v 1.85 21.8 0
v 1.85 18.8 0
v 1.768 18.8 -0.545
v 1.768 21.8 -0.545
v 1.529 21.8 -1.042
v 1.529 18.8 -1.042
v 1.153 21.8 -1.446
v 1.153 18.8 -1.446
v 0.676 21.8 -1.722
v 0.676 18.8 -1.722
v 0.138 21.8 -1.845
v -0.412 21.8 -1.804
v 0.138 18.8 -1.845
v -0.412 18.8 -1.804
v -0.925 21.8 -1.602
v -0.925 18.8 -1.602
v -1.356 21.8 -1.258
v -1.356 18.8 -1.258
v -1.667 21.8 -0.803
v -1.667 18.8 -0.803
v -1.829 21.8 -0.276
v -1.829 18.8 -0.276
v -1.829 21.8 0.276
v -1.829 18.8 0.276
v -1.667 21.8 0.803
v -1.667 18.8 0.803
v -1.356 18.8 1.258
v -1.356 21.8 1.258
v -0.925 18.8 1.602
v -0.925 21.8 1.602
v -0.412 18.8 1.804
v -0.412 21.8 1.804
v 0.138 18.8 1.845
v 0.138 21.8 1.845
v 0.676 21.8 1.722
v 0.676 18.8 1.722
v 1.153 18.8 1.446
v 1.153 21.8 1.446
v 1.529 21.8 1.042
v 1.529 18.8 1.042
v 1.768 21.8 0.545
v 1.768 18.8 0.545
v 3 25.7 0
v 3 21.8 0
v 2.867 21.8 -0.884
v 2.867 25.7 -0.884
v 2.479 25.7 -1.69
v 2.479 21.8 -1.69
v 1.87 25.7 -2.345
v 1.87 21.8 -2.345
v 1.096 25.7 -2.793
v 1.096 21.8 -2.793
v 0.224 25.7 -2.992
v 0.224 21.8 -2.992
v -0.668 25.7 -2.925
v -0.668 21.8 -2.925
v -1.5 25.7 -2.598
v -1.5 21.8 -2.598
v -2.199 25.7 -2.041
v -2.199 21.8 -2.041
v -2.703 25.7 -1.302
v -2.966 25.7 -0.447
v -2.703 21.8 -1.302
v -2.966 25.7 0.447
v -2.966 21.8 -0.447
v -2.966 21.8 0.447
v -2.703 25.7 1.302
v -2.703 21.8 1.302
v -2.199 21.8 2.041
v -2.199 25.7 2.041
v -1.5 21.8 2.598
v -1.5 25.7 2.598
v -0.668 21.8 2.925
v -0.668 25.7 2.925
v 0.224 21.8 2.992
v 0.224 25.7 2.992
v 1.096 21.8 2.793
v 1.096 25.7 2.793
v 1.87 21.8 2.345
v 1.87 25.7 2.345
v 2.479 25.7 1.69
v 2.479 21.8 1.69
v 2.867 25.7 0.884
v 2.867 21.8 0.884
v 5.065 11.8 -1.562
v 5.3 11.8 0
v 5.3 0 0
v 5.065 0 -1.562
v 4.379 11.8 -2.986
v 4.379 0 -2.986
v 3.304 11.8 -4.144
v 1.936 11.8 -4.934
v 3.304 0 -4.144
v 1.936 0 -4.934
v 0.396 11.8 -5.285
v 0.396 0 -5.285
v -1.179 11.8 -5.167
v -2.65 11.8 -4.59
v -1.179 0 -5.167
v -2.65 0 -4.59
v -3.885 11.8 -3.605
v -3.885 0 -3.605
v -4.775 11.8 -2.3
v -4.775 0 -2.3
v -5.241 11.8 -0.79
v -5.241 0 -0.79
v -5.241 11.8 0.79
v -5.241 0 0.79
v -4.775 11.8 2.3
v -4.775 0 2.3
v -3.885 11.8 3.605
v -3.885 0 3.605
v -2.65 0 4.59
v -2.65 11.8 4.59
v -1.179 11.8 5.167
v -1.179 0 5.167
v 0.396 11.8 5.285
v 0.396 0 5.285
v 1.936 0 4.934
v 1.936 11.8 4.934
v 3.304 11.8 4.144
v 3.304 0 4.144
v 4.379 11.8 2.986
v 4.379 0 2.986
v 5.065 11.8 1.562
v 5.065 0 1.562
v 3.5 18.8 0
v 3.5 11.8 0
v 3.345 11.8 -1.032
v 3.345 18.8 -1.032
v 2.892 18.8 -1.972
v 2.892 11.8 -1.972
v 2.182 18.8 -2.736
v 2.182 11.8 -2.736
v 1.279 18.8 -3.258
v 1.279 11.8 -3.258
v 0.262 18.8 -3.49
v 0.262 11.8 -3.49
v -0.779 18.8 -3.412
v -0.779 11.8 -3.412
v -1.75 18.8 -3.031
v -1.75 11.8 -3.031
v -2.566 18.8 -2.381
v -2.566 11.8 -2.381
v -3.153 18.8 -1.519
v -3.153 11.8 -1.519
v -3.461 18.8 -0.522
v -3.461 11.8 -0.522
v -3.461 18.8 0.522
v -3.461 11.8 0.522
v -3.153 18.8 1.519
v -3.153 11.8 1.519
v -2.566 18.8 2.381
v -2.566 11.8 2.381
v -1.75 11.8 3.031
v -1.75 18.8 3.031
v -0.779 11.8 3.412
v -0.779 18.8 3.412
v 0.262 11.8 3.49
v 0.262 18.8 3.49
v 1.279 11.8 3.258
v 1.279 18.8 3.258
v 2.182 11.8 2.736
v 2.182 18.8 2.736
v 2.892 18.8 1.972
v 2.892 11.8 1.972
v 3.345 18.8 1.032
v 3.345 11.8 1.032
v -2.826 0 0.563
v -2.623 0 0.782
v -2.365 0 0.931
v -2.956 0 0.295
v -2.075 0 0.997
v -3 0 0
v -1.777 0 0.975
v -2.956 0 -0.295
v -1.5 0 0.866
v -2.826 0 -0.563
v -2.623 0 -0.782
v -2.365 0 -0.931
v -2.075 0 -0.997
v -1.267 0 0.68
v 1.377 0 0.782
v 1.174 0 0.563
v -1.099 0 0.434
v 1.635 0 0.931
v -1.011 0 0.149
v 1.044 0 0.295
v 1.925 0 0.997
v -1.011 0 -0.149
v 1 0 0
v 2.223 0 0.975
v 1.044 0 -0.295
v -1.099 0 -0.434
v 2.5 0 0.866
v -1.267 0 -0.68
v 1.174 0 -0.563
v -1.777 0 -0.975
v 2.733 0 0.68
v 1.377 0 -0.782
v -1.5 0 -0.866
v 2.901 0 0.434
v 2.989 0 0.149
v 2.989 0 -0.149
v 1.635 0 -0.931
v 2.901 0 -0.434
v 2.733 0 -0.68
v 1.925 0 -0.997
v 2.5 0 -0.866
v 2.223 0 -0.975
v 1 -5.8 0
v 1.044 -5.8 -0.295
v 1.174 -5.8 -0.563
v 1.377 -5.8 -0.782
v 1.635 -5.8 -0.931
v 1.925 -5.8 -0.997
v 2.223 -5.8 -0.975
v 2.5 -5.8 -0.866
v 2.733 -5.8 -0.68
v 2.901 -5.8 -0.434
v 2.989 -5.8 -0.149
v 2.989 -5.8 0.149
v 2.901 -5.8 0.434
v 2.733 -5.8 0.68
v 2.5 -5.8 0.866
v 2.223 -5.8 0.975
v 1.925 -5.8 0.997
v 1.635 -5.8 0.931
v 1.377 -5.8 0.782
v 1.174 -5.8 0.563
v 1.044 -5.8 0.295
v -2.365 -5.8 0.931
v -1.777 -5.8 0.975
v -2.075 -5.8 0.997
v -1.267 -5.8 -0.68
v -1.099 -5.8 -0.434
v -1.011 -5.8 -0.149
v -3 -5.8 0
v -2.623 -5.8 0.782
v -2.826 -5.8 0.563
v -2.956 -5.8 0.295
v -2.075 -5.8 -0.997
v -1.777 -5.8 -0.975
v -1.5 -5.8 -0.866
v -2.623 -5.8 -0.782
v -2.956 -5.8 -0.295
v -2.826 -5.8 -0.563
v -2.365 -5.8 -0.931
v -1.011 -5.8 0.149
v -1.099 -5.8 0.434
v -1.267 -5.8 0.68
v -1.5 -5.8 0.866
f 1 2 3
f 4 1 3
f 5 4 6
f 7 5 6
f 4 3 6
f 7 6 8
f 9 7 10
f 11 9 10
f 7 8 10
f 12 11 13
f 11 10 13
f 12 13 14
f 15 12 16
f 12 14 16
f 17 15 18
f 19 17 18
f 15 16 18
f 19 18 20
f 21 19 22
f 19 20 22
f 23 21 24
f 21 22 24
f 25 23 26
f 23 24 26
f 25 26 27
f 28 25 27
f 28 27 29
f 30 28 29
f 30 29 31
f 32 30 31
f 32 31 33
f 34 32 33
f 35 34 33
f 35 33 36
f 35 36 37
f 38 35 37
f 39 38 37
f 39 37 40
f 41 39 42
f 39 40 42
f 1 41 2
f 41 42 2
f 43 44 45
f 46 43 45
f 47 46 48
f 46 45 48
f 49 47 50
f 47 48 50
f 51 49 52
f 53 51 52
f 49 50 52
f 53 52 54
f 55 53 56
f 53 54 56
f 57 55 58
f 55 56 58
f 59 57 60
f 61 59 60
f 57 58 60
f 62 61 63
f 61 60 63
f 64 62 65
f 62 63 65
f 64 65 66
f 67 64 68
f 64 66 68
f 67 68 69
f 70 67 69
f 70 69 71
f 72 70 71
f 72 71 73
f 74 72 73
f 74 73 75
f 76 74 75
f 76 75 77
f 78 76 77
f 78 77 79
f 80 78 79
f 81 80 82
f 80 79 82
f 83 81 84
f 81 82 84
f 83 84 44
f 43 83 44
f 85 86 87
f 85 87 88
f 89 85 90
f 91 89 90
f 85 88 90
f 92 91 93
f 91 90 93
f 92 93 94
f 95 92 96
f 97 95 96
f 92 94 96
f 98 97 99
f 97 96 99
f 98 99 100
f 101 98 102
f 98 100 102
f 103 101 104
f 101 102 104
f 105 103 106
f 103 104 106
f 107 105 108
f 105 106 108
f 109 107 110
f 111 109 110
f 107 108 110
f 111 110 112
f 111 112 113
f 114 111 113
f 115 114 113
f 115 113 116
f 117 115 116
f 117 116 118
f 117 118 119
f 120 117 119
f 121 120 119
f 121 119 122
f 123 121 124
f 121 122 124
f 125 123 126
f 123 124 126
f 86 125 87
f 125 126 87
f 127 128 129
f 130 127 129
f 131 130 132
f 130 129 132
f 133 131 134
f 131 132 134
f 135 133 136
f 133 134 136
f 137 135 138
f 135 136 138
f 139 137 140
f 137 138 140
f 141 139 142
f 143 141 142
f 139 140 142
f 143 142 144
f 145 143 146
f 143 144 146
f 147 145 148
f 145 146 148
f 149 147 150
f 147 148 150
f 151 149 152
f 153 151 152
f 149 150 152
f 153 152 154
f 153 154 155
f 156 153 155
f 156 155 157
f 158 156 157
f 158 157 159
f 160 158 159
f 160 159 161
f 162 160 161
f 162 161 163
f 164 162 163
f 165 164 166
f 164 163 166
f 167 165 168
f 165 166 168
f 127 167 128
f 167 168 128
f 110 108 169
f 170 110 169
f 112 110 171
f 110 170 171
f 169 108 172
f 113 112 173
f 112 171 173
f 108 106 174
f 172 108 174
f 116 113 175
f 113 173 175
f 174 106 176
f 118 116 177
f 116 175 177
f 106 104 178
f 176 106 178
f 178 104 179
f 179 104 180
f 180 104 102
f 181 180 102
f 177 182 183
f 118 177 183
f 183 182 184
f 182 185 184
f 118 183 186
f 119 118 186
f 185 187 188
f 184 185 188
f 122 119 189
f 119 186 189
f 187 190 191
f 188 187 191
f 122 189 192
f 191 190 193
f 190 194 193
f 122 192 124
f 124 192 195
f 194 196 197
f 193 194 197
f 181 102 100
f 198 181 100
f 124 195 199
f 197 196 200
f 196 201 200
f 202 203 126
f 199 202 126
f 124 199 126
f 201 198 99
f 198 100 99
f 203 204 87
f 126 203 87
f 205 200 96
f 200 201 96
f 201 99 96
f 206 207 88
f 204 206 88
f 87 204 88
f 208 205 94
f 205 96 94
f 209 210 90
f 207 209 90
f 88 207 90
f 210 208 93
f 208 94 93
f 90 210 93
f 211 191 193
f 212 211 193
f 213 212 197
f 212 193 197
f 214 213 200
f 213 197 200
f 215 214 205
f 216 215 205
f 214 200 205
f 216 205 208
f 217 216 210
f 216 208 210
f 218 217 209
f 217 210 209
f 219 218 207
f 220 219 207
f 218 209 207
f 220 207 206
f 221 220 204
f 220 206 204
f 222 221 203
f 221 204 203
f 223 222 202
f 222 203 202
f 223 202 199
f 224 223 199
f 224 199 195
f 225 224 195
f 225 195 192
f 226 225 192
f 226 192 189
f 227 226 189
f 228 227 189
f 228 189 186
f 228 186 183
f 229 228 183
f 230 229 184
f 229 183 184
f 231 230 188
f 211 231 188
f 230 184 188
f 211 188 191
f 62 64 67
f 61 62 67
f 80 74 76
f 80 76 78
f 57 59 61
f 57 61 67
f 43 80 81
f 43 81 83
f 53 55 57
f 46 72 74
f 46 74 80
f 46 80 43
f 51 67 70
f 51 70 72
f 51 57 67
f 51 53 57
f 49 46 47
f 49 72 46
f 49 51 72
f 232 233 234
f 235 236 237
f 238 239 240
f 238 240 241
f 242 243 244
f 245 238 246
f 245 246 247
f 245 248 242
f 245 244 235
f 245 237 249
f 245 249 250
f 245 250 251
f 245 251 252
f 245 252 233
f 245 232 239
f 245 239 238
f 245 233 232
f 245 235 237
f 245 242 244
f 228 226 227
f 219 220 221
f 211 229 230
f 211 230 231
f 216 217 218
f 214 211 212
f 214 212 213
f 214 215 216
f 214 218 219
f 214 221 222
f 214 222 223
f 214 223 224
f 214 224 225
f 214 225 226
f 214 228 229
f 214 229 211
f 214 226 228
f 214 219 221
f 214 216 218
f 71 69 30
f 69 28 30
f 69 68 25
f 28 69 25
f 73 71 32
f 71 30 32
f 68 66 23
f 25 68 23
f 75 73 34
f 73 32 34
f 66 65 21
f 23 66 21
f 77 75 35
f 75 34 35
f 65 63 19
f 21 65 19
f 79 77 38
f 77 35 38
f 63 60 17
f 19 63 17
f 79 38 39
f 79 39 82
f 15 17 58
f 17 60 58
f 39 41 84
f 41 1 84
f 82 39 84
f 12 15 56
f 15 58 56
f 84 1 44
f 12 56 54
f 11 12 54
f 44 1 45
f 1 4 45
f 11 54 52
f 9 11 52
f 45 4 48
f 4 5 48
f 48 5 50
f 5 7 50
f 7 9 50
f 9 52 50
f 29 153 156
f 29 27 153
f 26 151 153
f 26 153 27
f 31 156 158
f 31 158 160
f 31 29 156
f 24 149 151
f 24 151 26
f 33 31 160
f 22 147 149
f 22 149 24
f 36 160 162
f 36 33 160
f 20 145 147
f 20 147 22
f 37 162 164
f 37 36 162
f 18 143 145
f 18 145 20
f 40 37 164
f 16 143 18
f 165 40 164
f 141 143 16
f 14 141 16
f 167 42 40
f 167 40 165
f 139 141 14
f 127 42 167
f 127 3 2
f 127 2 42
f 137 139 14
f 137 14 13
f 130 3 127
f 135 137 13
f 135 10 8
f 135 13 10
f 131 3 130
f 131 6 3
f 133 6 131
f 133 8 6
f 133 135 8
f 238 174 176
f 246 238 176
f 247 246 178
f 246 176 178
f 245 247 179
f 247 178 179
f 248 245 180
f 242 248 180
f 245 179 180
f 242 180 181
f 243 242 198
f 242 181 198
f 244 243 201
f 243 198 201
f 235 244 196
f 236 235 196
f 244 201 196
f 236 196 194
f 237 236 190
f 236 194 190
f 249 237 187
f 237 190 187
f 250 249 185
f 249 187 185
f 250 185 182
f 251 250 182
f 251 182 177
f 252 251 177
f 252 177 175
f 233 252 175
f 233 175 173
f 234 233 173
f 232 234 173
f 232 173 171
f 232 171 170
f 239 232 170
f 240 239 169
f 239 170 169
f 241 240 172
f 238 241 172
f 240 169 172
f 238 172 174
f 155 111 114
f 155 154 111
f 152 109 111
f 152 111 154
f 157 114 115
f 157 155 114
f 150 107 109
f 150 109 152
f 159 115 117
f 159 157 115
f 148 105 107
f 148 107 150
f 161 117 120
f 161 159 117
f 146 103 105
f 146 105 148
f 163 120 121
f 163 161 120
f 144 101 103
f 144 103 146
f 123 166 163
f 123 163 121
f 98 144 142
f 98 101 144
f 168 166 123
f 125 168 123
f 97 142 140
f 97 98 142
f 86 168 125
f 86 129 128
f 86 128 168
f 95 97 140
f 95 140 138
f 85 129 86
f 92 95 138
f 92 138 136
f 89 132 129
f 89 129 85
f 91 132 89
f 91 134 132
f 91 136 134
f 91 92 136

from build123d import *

# Parameters (mm, degrees)
SKETCH2_R           = 5.3
BOSS_EXTRUDE1_DEPTH = 11.8
SKETCH3_R           = 3.5
BOSS_EXTRUDE2_DEPTH = 7
SKETCH4_R           = 1.85
BOSS_EXTRUDE3_DEPTH = 3
SKETCH5_R           = 3
BOSS_EXTRUDE4_DEPTH = 3.9
SKETCH6_R           = 1
BOSS_EXTRUDE5_DEPTH = 5.8


with BuildPart() as part:
    # Sketch2 → Boss-Extrude1 (new body)
    with BuildSketch(Plane(origin=(0, 0, 0), x_dir=(1, 0, 0), z_dir=(0, 1, 0))):
        Circle(SKETCH2_R)
    extrude(amount=BOSS_EXTRUDE1_DEPTH)

    # Sketch3 → Boss-Extrude2 (add)
    with BuildSketch(Plane(origin=(0, 11.8, 0), x_dir=(1, 0, 0), z_dir=(0, 1, 0))):
        Circle(SKETCH3_R)
    extrude(amount=BOSS_EXTRUDE2_DEPTH)

    # Sketch4 → Boss-Extrude3 (add)
    with BuildSketch(Plane(origin=(0, 18.8, 0), x_dir=(1, 0, 0), z_dir=(0, 1, 0))):
        Circle(SKETCH4_R)
    extrude(amount=BOSS_EXTRUDE3_DEPTH)

    # Sketch5 → Boss-Extrude4 (add)
    with BuildSketch(Plane(origin=(0, 21.8, 0), x_dir=(1, 0, 0), z_dir=(0, 1, 0))):
        Circle(SKETCH5_R)
    extrude(amount=BOSS_EXTRUDE4_DEPTH)

    # Sketch6 → Boss-Extrude5 (add)
    with BuildSketch(Plane(origin=(0, 0, 0), x_dir=(-1, 0, 0), z_dir=(0, -1, 0))):
        with Locations((2, 0)):
            Circle(SKETCH6_R)
        with Locations((-2, 0)):
            Circle(SKETCH6_R)
    extrude(amount=BOSS_EXTRUDE5_DEPTH)


solid = part.part
